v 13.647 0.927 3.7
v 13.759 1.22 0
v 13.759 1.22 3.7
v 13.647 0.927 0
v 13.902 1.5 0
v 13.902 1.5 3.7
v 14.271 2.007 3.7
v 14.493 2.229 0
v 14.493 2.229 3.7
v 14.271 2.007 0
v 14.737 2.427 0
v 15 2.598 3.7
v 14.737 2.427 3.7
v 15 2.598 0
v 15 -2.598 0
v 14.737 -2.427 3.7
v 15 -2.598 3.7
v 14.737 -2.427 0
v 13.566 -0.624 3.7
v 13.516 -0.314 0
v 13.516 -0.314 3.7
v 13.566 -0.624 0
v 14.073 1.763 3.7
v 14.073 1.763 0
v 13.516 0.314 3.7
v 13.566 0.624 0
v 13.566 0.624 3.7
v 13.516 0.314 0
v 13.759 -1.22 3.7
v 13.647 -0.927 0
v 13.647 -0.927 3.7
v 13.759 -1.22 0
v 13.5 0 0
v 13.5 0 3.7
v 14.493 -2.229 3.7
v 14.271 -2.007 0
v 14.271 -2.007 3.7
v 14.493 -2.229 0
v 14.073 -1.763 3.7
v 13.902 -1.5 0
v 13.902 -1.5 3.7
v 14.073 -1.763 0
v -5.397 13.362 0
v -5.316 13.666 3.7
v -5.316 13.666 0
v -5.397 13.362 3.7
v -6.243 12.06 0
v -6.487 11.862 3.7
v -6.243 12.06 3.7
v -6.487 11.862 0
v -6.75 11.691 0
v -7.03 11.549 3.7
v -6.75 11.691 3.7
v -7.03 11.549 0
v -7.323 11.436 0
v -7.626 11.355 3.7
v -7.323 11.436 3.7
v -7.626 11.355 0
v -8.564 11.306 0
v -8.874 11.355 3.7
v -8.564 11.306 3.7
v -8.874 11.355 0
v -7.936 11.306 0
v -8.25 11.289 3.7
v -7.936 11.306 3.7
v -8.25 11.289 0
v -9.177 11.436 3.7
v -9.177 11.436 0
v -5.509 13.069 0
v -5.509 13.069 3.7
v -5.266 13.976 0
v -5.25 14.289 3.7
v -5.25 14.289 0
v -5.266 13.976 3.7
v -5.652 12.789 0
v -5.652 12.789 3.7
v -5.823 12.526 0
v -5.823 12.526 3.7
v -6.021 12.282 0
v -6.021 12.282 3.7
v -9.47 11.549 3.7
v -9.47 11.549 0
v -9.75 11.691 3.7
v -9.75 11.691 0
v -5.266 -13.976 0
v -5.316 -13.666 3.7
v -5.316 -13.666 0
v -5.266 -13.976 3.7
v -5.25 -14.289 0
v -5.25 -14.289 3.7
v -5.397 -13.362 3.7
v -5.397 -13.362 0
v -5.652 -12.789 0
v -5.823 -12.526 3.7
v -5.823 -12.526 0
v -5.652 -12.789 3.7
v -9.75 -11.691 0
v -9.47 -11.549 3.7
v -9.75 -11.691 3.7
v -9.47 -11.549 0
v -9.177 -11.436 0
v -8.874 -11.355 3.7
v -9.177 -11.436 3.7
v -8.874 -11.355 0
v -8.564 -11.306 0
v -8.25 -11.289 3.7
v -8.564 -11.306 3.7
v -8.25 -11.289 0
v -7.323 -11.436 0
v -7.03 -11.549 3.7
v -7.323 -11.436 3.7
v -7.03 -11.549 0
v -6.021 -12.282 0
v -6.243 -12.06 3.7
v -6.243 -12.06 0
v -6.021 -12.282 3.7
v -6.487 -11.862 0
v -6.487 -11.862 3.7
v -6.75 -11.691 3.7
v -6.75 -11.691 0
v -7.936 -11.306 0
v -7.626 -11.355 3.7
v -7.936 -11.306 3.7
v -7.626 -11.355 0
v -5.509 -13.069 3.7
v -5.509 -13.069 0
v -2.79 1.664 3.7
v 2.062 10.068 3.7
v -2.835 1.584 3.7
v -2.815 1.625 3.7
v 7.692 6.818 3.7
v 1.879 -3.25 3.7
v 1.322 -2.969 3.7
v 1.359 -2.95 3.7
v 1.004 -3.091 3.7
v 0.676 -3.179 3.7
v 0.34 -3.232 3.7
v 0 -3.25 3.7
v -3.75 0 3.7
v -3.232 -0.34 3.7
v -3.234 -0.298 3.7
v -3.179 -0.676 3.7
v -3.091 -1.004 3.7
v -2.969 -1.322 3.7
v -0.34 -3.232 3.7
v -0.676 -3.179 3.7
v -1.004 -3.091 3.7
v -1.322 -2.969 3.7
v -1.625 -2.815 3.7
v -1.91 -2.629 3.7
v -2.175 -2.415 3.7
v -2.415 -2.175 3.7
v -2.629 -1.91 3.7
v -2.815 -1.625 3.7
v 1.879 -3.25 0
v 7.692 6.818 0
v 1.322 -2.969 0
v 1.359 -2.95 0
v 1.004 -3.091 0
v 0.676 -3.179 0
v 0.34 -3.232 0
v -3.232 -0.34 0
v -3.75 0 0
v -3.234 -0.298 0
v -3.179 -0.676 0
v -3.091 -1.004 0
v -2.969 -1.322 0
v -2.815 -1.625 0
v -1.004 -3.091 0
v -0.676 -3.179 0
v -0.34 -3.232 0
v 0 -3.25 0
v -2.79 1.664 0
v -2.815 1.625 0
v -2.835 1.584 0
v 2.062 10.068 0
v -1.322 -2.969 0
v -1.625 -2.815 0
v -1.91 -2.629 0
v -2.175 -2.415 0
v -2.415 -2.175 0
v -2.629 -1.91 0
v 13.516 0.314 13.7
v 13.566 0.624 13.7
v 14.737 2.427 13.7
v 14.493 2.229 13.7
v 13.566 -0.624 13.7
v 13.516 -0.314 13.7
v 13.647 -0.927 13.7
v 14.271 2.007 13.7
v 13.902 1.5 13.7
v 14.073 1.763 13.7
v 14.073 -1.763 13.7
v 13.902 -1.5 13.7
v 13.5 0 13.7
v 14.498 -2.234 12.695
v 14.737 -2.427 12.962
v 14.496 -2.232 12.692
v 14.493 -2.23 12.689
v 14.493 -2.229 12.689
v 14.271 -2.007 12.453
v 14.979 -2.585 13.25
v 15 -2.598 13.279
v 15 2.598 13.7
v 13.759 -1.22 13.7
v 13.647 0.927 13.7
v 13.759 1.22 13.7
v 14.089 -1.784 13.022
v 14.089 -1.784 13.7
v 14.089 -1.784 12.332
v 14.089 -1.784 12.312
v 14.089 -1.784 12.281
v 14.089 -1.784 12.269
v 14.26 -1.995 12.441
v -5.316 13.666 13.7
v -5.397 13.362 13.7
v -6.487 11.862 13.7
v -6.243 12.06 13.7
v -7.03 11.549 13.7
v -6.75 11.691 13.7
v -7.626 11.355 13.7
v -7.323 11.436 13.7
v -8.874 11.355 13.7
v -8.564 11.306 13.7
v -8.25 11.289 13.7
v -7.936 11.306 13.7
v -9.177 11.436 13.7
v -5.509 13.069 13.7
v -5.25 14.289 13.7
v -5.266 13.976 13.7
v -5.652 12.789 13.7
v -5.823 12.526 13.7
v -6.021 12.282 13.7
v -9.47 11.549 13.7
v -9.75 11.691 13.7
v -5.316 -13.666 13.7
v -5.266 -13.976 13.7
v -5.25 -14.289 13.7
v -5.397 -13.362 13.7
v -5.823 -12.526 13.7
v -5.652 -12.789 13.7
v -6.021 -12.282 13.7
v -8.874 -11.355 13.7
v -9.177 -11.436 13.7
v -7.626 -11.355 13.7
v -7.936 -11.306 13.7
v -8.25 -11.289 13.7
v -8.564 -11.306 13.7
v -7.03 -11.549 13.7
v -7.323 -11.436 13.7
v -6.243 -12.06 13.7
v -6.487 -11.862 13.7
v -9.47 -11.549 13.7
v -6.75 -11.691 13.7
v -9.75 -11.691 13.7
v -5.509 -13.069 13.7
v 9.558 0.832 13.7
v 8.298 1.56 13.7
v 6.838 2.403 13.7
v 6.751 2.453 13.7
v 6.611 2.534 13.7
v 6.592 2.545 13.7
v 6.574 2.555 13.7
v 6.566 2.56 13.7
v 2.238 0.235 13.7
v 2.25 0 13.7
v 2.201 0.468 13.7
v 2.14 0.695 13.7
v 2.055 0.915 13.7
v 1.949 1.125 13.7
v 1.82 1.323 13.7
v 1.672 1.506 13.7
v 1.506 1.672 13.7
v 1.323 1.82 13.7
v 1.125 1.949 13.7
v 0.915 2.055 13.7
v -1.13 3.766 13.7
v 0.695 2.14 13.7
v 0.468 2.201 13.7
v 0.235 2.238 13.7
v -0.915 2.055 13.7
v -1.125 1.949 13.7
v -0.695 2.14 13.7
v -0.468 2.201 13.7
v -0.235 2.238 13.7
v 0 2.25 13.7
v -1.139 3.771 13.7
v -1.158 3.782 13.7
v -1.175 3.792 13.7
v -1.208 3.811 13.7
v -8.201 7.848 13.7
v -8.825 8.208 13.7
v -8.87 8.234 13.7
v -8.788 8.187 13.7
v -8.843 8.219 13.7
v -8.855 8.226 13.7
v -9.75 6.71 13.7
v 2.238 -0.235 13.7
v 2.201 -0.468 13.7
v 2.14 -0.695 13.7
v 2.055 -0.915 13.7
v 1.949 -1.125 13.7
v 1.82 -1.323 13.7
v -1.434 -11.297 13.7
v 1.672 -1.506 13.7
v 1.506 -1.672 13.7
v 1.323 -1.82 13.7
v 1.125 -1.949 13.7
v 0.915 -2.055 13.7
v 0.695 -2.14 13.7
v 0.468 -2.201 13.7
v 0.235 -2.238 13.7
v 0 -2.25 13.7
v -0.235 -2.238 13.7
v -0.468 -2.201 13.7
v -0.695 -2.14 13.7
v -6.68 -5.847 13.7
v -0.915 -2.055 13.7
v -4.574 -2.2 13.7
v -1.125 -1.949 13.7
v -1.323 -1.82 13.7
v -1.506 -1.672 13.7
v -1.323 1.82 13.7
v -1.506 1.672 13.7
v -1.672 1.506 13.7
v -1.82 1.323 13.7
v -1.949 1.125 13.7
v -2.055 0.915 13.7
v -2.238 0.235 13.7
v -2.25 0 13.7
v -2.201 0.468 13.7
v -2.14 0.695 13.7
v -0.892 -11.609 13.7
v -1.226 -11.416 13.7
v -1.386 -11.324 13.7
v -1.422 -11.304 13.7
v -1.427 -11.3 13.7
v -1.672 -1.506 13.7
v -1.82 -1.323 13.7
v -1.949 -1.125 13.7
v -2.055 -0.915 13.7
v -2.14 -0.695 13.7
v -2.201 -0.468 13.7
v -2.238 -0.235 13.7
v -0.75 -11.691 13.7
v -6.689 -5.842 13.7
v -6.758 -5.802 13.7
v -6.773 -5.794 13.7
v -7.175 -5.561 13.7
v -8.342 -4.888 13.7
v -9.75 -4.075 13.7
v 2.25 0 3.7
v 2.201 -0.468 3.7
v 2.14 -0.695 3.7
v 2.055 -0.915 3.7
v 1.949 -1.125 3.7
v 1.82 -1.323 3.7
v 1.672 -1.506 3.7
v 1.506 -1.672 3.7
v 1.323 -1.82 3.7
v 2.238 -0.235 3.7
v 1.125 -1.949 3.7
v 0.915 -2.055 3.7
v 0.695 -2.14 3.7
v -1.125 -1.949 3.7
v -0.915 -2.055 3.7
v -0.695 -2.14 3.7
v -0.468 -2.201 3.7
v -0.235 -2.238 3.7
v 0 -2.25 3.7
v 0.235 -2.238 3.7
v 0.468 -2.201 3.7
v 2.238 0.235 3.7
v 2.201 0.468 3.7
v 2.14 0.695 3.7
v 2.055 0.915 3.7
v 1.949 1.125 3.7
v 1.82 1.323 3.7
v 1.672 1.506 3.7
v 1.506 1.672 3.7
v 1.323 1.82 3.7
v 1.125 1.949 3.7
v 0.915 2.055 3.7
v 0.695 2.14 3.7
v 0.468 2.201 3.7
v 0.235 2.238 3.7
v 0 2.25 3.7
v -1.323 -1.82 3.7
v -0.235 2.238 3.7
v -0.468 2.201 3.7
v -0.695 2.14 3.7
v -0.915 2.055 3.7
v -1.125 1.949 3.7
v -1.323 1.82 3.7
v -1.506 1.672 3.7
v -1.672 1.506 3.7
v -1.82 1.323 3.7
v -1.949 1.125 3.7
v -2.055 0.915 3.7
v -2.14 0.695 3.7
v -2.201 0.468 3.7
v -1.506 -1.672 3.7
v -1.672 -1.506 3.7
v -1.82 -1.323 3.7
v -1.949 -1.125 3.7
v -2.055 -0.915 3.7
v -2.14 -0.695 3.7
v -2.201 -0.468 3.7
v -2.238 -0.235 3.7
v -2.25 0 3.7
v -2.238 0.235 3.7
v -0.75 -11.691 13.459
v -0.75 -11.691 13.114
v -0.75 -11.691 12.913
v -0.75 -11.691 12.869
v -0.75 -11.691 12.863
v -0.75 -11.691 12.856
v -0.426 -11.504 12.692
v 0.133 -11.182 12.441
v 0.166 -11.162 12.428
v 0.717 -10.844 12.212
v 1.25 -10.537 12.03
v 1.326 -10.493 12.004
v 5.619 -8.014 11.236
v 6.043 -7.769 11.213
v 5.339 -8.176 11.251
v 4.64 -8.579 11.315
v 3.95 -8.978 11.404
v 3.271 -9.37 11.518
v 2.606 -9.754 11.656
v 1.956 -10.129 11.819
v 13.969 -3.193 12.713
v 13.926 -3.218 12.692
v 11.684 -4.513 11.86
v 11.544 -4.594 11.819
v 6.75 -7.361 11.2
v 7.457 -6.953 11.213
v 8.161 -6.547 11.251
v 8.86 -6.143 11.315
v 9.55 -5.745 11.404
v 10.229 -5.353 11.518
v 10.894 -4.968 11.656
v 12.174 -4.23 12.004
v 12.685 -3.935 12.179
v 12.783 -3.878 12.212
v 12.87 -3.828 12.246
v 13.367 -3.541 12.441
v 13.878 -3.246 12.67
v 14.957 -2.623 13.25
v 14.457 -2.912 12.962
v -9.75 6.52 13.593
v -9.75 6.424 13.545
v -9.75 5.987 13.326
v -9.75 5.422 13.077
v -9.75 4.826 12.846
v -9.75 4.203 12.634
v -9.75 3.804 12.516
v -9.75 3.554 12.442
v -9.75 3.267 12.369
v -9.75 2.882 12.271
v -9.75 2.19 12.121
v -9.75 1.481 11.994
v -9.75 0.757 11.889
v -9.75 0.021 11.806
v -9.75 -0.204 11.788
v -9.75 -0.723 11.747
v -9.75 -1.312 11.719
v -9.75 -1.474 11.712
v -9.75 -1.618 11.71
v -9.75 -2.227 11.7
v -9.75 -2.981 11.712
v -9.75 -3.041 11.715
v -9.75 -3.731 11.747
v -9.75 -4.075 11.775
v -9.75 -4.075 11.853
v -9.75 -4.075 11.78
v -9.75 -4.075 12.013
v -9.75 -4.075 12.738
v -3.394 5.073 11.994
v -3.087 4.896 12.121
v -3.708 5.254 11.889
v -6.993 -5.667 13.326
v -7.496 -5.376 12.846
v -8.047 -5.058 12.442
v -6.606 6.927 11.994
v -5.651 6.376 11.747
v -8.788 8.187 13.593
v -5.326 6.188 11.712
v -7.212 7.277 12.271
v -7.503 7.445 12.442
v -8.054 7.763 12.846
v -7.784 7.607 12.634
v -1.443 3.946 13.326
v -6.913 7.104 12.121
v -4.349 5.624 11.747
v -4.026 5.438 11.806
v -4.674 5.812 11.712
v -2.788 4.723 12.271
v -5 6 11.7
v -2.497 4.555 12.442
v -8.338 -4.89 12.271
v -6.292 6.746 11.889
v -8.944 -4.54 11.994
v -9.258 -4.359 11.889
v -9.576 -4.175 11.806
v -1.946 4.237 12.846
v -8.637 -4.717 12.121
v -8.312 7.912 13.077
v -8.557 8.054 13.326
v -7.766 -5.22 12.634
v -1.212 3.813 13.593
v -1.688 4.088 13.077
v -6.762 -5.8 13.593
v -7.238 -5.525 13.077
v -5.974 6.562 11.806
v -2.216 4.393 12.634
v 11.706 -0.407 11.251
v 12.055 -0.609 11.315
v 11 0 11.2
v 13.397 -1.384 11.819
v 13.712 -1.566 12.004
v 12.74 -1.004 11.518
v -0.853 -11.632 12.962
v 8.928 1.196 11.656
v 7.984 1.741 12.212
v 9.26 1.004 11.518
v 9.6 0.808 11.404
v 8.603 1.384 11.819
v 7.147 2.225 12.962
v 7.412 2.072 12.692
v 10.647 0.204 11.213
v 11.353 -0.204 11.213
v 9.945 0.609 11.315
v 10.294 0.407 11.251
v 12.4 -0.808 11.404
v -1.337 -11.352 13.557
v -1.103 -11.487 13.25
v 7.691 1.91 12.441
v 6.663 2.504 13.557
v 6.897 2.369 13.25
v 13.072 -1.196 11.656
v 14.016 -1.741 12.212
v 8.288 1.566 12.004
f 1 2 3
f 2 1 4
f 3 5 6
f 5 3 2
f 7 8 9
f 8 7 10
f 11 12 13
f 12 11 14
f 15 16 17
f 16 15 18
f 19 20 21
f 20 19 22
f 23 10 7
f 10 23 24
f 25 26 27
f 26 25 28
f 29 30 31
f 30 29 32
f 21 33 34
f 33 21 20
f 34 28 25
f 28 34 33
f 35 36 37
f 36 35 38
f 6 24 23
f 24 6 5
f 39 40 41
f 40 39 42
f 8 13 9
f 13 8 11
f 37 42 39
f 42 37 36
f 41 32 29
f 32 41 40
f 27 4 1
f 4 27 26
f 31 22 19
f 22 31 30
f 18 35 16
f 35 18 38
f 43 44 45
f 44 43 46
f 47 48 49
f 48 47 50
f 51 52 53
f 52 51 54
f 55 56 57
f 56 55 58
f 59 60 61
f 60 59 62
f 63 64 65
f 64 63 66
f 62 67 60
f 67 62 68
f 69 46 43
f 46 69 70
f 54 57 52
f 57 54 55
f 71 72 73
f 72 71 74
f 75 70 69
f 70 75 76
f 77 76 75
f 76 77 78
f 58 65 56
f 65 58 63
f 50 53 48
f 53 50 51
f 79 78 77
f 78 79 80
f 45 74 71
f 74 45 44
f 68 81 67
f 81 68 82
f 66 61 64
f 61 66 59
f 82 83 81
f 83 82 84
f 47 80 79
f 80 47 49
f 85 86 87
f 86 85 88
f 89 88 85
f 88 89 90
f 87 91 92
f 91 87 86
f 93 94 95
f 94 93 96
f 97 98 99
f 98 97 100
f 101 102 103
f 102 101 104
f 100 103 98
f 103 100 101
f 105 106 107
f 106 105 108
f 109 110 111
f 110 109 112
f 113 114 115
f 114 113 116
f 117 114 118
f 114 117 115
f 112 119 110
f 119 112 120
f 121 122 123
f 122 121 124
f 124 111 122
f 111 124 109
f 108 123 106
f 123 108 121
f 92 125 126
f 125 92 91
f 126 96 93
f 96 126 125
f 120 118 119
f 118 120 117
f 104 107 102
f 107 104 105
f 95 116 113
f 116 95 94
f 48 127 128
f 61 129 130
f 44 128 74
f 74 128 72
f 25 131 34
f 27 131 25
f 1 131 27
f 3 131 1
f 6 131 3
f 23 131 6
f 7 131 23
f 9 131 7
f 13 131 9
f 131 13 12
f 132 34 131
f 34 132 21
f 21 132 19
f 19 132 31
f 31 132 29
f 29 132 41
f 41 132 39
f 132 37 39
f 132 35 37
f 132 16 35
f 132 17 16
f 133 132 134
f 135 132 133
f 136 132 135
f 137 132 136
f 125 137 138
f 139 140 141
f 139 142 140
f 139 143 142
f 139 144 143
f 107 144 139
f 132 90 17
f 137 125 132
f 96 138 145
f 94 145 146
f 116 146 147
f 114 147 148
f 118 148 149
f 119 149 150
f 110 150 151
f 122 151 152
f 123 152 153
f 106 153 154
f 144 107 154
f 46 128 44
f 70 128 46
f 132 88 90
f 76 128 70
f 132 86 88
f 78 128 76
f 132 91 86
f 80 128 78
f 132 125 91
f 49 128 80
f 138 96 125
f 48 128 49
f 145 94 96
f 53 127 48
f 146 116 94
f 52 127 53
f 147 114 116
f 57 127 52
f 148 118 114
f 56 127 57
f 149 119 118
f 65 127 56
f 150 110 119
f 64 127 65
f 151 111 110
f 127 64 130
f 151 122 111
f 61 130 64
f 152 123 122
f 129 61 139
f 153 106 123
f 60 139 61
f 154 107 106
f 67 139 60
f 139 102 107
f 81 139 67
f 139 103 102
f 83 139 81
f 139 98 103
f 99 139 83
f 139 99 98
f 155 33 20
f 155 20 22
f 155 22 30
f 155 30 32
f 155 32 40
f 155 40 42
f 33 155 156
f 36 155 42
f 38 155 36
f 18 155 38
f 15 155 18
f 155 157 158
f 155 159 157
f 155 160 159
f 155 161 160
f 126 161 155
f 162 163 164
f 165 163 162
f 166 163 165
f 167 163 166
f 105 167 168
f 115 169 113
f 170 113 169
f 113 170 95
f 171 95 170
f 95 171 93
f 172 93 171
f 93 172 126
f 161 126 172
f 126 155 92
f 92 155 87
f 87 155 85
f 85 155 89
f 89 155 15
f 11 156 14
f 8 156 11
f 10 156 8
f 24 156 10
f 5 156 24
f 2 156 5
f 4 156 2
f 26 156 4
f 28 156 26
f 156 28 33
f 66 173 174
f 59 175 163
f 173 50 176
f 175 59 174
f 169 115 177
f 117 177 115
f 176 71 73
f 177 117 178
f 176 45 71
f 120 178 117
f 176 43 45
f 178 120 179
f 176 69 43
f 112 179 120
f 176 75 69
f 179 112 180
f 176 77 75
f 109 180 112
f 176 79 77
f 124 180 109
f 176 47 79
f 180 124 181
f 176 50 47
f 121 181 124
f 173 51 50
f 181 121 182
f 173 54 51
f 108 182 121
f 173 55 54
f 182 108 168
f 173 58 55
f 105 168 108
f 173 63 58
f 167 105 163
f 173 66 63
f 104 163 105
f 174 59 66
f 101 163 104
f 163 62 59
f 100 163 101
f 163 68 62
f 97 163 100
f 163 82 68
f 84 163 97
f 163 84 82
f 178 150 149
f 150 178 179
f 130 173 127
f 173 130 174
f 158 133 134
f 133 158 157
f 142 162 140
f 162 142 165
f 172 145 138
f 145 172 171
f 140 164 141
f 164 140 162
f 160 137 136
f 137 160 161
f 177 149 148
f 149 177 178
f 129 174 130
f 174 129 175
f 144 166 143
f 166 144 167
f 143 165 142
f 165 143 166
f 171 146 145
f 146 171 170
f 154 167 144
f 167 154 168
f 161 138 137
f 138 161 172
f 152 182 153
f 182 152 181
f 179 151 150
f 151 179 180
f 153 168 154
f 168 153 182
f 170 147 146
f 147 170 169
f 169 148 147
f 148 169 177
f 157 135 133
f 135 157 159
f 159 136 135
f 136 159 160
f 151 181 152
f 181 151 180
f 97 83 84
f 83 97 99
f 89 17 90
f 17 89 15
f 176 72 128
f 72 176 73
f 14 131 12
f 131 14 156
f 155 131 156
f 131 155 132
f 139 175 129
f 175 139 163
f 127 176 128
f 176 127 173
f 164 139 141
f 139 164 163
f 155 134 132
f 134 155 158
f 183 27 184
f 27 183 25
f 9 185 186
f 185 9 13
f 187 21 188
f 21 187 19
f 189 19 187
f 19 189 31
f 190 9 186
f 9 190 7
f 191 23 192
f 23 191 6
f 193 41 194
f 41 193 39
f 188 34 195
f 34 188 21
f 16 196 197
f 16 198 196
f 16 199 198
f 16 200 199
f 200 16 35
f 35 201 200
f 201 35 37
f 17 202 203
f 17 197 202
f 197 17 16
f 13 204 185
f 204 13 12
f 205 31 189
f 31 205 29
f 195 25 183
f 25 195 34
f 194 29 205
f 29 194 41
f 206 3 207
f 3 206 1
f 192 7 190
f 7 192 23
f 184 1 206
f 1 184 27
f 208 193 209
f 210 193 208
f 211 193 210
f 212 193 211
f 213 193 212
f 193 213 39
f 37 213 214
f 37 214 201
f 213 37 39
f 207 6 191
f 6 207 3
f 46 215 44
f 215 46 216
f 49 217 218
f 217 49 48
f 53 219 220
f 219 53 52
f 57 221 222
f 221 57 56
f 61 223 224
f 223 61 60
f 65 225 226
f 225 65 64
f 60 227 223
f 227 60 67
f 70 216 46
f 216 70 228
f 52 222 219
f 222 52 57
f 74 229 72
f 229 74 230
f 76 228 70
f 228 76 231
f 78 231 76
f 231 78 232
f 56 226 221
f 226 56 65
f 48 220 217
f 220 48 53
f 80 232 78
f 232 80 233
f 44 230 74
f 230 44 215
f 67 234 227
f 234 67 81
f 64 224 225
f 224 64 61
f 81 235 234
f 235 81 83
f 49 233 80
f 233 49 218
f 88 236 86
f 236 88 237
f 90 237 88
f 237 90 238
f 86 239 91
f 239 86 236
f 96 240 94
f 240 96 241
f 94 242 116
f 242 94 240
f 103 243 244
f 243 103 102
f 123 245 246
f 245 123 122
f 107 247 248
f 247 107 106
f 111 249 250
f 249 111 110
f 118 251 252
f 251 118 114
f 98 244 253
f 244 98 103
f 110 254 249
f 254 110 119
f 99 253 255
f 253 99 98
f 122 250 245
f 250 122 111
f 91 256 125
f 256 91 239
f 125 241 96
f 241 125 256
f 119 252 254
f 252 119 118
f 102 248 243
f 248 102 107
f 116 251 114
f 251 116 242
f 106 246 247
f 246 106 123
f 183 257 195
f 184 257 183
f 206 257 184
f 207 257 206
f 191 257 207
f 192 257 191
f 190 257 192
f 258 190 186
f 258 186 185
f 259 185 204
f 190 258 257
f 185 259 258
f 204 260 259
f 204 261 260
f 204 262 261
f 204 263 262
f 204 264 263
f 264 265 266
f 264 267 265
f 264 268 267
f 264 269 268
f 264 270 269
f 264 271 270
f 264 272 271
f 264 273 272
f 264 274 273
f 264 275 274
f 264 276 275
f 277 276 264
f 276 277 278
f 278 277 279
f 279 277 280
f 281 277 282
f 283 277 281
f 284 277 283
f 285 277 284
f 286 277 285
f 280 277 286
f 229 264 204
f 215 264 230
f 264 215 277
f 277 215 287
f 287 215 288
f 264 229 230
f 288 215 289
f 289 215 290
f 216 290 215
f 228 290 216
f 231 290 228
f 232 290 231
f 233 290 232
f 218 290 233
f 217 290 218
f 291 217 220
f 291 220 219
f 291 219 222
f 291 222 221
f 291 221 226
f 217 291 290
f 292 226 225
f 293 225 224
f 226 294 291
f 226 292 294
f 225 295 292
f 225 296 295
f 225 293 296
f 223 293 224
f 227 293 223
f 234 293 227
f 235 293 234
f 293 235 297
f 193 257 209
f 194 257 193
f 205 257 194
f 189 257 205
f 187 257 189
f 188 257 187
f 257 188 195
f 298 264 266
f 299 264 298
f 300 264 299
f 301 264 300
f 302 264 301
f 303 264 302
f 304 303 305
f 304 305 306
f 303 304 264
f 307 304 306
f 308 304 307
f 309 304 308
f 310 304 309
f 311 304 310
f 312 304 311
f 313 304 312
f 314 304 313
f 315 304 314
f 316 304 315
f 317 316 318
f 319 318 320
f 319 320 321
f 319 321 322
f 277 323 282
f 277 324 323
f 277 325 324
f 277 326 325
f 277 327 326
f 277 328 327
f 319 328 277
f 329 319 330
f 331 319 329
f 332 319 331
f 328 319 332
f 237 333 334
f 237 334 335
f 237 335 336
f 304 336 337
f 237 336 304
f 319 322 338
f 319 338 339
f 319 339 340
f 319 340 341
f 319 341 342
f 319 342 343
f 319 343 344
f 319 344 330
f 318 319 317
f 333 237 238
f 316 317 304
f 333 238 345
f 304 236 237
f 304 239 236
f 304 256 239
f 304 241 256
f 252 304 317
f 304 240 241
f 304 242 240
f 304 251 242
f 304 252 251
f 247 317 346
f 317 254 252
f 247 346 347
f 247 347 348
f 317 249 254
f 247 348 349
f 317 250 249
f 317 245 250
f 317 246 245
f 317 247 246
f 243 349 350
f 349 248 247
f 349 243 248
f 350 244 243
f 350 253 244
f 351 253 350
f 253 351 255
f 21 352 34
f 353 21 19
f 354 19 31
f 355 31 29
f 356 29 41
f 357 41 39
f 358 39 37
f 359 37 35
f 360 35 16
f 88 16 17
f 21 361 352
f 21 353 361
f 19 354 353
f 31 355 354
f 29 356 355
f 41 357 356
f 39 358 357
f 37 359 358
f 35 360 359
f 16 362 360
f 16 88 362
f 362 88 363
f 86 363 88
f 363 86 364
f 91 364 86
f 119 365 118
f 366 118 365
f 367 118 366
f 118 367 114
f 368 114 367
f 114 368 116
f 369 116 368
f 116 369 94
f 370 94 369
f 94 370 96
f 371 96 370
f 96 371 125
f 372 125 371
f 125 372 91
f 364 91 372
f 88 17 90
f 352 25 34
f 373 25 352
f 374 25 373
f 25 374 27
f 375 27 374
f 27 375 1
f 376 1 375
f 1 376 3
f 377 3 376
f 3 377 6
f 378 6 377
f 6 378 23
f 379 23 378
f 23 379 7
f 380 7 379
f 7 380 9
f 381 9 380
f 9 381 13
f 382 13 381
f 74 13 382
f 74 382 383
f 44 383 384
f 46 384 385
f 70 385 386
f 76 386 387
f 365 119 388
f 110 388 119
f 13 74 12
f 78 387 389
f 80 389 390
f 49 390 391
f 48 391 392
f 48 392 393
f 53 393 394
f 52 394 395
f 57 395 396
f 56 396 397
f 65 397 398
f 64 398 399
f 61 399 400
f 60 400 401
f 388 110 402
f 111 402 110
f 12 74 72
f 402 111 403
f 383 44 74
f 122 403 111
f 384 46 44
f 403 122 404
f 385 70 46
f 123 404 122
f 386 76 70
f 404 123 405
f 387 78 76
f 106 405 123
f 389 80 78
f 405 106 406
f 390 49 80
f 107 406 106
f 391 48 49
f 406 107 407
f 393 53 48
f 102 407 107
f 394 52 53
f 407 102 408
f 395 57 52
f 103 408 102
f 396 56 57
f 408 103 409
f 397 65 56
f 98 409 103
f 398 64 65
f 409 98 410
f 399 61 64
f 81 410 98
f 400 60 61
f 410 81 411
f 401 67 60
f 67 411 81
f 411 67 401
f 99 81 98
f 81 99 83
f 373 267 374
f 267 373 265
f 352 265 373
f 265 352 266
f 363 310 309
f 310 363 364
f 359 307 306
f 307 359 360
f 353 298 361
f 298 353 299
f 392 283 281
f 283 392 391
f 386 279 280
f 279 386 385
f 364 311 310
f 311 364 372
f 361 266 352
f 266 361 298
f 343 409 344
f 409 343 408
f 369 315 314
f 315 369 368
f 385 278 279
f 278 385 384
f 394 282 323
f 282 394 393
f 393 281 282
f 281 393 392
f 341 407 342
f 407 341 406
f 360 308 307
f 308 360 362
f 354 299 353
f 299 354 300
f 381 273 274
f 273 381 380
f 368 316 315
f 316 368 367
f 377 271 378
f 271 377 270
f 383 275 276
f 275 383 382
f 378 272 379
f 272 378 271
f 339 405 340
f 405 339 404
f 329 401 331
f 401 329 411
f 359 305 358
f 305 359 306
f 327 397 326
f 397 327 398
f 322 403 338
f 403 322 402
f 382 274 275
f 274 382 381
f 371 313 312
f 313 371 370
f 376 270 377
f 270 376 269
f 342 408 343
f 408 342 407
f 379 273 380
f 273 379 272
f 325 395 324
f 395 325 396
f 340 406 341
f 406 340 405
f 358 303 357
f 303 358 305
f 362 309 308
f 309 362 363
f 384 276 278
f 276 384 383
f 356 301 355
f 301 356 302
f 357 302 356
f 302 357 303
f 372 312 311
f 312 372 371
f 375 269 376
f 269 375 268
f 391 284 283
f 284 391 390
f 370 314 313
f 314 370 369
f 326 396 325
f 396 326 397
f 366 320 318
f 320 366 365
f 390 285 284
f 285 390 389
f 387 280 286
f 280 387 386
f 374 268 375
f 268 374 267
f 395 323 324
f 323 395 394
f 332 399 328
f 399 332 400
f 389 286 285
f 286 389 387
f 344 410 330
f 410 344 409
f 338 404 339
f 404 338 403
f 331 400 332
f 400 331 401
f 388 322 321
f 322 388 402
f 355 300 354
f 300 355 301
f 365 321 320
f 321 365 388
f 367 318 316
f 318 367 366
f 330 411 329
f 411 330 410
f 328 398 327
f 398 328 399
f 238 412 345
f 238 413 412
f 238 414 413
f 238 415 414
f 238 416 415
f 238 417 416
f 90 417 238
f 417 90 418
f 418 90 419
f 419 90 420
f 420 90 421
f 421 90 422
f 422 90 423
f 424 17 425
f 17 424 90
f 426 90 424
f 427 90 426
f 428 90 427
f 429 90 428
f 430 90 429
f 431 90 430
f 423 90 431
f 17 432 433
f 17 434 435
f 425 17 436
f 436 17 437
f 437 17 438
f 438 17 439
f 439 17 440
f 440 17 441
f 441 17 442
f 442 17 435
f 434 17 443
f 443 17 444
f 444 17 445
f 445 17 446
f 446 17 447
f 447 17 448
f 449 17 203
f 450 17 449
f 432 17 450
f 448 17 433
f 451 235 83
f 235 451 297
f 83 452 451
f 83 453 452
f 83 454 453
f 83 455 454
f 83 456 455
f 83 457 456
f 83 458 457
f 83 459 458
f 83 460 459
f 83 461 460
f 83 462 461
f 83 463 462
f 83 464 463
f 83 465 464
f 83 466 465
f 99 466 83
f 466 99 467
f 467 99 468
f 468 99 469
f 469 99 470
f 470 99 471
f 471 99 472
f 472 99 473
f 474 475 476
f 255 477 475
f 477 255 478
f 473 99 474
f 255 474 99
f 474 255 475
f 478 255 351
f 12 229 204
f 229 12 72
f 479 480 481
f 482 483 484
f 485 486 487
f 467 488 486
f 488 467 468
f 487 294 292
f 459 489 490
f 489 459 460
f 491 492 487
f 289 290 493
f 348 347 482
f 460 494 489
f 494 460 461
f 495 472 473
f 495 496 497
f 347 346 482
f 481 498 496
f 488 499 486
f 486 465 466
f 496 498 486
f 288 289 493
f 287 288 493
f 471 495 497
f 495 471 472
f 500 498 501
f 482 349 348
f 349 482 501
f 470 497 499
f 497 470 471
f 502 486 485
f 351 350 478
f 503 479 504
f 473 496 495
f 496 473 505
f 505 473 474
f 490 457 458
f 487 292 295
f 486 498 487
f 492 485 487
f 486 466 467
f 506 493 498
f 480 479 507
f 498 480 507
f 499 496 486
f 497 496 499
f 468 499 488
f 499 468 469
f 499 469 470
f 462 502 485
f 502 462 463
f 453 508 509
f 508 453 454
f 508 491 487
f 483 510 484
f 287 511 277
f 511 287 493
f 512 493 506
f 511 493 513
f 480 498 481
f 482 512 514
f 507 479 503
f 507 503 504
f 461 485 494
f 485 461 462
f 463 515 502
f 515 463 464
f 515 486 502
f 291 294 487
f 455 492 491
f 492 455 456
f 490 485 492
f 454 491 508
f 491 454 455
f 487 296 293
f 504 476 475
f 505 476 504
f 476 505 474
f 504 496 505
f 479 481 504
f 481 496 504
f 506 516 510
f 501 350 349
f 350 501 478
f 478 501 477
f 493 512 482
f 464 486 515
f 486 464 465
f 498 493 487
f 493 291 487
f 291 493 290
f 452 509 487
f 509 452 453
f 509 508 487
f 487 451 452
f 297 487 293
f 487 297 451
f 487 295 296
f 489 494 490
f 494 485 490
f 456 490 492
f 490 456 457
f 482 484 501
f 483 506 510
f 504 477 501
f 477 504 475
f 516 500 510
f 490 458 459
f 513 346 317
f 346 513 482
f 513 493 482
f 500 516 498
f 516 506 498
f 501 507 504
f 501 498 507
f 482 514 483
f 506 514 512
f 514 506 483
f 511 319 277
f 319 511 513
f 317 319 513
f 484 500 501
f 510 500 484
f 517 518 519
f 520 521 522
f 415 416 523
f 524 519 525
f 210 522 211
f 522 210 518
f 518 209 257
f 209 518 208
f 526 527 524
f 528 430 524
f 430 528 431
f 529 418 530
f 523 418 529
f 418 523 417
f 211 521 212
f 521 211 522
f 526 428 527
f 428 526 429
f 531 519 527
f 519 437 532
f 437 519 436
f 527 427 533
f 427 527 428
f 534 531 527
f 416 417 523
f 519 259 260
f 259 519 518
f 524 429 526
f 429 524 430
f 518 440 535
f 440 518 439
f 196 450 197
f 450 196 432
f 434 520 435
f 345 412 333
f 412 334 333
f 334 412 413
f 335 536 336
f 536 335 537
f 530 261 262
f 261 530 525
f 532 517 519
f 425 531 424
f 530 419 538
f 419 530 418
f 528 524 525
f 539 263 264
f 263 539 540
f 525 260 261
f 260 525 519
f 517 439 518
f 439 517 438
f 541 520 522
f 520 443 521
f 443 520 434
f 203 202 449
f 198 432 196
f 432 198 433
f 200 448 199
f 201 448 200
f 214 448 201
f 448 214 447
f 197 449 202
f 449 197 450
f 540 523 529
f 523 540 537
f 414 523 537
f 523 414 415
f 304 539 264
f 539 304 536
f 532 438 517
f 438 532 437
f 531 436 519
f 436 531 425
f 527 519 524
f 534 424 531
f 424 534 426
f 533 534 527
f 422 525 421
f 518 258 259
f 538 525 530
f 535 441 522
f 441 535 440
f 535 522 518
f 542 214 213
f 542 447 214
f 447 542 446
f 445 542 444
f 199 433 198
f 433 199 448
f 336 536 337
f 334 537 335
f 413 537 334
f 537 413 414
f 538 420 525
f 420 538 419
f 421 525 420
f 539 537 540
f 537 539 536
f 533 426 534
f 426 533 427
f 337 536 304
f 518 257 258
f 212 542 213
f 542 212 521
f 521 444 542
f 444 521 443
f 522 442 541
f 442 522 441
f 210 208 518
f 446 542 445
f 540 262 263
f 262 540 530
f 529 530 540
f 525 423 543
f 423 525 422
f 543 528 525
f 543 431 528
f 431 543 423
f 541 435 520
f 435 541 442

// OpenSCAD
upper_plate_radius = 19.75;
screw_distance_from_center = 16.5;
screw_hole_diameter = 6; // M3 head is usually 5.5mm
ptfe_hole_diameter = 4.5;
height = 10;
hotend_ptfe_diameter = 6.5;
hotend_ptfe_protrusion = 3.7;
extruder_gear_length = 11.1;
extruder_gear_diameter = 12;
extruder_idler_length = 16;
extruder_idler_diameter = 13;
HOLE_BUFFER_HEIGHT = 1;
$fn = 100;

extruder_support();

module extruder_support() {
    difference() {
        union() {
            hotend_ptfe_support(
                hotend_ptfe_protrusion,
                hotend_ptfe_diameter,
                upper_plate_radius,
                screw_hole_diameter,
                screw_distance_from_center
            );

            translate([0, 0, hotend_ptfe_protrusion])
                extruder_support_with_ptfe_hole(
                    height,
                    upper_plate_radius,
                    screw_distance_from_center,
                    screw_hole_diameter,
                    ptfe_hole_diameter
                );
        }
        union() {
            // Dent for the extruder gear
            translate([-5, 6, height + hotend_ptfe_protrusion + 4]) {
                rotate([120, 90, 0]) {
                    cylinder(h = extruder_gear_length, d = extruder_gear_diameter);
                }
            }
            // Dent for the extruder idler
            translate([11, 0, height + hotend_ptfe_protrusion + 4]) {
                rotate([120, 90, 0]) {
                    cylinder(h = extruder_idler_length, d = extruder_idler_diameter);
                }
            }
        }

    }
}

module hotend_ptfe_support(hotend_ptfe_protrusion, hotend_ptfe_diameter, upper_plate_radius, screw_hole_diameter, screw_distance_from_center) {
    // Additional support to hold hotend ptfe protrusion
    difference() {
        extruder_support_with_ptfe_hole(
            hotend_ptfe_protrusion,
            upper_plate_radius,
            screw_distance_from_center,
            screw_hole_diameter,
            hotend_ptfe_diameter
        );
        translate([-((hotend_ptfe_diameter / 2) + 0.5), 0, -HOLE_BUFFER_HEIGHT]) {
            rotate([0, 0, -30]) {
                cube([hotend_ptfe_diameter, upper_plate_radius, hotend_ptfe_protrusion + HOLE_BUFFER_HEIGHT]);
            }
        }
    }
}

module extruder_support_with_ptfe_hole(height, uper_plate_radius, screw_distance_from_center, screw_hole_diameter, ptfe_hole_diameter) {
    height_with_hole_buffer = height + (HOLE_BUFFER_HEIGHT * 2);

    intersection(){
        difference(){
            cylinder(r = upper_plate_radius, h = height);
            
            // Screw Holes
            for(angle=[0:120:359]){
                polar_translate(screw_distance_from_center, angle, -HOLE_BUFFER_HEIGHT)
                    cylinder(d = screw_hole_diameter, h = height_with_hole_buffer, $fn = 60);
            }
            
            // PTFE Tube/Filament Hole
            translate([0, 0, -HOLE_BUFFER_HEIGHT])
                cylinder(d = ptfe_hole_diameter, h = height_with_hole_buffer, $fn = 60);
        }
        // Trianguar Cut
        translate([0, 0, -HOLE_BUFFER_HEIGHT])
            polar_equilateral(screw_distance_from_center + 3, height_with_hole_buffer);
    }
}

function polar_to_cartesian(distance_from_center, angle) =
    [distance_from_center * cos(angle), distance_from_center * sin(angle)];

module polar_translate(distance_from_center, angle, z=0) {
    xy = polar_to_cartesian(distance_from_center, angle);
    translate([xy[0], xy[1], z]) children();
}

module polar_equilateral(distance_from_center, height){
    linear_extrude(height = height){
        triangle_points = [
            polar_to_cartesian(distance_from_center, 0),
            polar_to_cartesian(distance_from_center, 120),
            polar_to_cartesian(distance_from_center, 240)
        ];
        polygon(triangle_points);
    };
}
